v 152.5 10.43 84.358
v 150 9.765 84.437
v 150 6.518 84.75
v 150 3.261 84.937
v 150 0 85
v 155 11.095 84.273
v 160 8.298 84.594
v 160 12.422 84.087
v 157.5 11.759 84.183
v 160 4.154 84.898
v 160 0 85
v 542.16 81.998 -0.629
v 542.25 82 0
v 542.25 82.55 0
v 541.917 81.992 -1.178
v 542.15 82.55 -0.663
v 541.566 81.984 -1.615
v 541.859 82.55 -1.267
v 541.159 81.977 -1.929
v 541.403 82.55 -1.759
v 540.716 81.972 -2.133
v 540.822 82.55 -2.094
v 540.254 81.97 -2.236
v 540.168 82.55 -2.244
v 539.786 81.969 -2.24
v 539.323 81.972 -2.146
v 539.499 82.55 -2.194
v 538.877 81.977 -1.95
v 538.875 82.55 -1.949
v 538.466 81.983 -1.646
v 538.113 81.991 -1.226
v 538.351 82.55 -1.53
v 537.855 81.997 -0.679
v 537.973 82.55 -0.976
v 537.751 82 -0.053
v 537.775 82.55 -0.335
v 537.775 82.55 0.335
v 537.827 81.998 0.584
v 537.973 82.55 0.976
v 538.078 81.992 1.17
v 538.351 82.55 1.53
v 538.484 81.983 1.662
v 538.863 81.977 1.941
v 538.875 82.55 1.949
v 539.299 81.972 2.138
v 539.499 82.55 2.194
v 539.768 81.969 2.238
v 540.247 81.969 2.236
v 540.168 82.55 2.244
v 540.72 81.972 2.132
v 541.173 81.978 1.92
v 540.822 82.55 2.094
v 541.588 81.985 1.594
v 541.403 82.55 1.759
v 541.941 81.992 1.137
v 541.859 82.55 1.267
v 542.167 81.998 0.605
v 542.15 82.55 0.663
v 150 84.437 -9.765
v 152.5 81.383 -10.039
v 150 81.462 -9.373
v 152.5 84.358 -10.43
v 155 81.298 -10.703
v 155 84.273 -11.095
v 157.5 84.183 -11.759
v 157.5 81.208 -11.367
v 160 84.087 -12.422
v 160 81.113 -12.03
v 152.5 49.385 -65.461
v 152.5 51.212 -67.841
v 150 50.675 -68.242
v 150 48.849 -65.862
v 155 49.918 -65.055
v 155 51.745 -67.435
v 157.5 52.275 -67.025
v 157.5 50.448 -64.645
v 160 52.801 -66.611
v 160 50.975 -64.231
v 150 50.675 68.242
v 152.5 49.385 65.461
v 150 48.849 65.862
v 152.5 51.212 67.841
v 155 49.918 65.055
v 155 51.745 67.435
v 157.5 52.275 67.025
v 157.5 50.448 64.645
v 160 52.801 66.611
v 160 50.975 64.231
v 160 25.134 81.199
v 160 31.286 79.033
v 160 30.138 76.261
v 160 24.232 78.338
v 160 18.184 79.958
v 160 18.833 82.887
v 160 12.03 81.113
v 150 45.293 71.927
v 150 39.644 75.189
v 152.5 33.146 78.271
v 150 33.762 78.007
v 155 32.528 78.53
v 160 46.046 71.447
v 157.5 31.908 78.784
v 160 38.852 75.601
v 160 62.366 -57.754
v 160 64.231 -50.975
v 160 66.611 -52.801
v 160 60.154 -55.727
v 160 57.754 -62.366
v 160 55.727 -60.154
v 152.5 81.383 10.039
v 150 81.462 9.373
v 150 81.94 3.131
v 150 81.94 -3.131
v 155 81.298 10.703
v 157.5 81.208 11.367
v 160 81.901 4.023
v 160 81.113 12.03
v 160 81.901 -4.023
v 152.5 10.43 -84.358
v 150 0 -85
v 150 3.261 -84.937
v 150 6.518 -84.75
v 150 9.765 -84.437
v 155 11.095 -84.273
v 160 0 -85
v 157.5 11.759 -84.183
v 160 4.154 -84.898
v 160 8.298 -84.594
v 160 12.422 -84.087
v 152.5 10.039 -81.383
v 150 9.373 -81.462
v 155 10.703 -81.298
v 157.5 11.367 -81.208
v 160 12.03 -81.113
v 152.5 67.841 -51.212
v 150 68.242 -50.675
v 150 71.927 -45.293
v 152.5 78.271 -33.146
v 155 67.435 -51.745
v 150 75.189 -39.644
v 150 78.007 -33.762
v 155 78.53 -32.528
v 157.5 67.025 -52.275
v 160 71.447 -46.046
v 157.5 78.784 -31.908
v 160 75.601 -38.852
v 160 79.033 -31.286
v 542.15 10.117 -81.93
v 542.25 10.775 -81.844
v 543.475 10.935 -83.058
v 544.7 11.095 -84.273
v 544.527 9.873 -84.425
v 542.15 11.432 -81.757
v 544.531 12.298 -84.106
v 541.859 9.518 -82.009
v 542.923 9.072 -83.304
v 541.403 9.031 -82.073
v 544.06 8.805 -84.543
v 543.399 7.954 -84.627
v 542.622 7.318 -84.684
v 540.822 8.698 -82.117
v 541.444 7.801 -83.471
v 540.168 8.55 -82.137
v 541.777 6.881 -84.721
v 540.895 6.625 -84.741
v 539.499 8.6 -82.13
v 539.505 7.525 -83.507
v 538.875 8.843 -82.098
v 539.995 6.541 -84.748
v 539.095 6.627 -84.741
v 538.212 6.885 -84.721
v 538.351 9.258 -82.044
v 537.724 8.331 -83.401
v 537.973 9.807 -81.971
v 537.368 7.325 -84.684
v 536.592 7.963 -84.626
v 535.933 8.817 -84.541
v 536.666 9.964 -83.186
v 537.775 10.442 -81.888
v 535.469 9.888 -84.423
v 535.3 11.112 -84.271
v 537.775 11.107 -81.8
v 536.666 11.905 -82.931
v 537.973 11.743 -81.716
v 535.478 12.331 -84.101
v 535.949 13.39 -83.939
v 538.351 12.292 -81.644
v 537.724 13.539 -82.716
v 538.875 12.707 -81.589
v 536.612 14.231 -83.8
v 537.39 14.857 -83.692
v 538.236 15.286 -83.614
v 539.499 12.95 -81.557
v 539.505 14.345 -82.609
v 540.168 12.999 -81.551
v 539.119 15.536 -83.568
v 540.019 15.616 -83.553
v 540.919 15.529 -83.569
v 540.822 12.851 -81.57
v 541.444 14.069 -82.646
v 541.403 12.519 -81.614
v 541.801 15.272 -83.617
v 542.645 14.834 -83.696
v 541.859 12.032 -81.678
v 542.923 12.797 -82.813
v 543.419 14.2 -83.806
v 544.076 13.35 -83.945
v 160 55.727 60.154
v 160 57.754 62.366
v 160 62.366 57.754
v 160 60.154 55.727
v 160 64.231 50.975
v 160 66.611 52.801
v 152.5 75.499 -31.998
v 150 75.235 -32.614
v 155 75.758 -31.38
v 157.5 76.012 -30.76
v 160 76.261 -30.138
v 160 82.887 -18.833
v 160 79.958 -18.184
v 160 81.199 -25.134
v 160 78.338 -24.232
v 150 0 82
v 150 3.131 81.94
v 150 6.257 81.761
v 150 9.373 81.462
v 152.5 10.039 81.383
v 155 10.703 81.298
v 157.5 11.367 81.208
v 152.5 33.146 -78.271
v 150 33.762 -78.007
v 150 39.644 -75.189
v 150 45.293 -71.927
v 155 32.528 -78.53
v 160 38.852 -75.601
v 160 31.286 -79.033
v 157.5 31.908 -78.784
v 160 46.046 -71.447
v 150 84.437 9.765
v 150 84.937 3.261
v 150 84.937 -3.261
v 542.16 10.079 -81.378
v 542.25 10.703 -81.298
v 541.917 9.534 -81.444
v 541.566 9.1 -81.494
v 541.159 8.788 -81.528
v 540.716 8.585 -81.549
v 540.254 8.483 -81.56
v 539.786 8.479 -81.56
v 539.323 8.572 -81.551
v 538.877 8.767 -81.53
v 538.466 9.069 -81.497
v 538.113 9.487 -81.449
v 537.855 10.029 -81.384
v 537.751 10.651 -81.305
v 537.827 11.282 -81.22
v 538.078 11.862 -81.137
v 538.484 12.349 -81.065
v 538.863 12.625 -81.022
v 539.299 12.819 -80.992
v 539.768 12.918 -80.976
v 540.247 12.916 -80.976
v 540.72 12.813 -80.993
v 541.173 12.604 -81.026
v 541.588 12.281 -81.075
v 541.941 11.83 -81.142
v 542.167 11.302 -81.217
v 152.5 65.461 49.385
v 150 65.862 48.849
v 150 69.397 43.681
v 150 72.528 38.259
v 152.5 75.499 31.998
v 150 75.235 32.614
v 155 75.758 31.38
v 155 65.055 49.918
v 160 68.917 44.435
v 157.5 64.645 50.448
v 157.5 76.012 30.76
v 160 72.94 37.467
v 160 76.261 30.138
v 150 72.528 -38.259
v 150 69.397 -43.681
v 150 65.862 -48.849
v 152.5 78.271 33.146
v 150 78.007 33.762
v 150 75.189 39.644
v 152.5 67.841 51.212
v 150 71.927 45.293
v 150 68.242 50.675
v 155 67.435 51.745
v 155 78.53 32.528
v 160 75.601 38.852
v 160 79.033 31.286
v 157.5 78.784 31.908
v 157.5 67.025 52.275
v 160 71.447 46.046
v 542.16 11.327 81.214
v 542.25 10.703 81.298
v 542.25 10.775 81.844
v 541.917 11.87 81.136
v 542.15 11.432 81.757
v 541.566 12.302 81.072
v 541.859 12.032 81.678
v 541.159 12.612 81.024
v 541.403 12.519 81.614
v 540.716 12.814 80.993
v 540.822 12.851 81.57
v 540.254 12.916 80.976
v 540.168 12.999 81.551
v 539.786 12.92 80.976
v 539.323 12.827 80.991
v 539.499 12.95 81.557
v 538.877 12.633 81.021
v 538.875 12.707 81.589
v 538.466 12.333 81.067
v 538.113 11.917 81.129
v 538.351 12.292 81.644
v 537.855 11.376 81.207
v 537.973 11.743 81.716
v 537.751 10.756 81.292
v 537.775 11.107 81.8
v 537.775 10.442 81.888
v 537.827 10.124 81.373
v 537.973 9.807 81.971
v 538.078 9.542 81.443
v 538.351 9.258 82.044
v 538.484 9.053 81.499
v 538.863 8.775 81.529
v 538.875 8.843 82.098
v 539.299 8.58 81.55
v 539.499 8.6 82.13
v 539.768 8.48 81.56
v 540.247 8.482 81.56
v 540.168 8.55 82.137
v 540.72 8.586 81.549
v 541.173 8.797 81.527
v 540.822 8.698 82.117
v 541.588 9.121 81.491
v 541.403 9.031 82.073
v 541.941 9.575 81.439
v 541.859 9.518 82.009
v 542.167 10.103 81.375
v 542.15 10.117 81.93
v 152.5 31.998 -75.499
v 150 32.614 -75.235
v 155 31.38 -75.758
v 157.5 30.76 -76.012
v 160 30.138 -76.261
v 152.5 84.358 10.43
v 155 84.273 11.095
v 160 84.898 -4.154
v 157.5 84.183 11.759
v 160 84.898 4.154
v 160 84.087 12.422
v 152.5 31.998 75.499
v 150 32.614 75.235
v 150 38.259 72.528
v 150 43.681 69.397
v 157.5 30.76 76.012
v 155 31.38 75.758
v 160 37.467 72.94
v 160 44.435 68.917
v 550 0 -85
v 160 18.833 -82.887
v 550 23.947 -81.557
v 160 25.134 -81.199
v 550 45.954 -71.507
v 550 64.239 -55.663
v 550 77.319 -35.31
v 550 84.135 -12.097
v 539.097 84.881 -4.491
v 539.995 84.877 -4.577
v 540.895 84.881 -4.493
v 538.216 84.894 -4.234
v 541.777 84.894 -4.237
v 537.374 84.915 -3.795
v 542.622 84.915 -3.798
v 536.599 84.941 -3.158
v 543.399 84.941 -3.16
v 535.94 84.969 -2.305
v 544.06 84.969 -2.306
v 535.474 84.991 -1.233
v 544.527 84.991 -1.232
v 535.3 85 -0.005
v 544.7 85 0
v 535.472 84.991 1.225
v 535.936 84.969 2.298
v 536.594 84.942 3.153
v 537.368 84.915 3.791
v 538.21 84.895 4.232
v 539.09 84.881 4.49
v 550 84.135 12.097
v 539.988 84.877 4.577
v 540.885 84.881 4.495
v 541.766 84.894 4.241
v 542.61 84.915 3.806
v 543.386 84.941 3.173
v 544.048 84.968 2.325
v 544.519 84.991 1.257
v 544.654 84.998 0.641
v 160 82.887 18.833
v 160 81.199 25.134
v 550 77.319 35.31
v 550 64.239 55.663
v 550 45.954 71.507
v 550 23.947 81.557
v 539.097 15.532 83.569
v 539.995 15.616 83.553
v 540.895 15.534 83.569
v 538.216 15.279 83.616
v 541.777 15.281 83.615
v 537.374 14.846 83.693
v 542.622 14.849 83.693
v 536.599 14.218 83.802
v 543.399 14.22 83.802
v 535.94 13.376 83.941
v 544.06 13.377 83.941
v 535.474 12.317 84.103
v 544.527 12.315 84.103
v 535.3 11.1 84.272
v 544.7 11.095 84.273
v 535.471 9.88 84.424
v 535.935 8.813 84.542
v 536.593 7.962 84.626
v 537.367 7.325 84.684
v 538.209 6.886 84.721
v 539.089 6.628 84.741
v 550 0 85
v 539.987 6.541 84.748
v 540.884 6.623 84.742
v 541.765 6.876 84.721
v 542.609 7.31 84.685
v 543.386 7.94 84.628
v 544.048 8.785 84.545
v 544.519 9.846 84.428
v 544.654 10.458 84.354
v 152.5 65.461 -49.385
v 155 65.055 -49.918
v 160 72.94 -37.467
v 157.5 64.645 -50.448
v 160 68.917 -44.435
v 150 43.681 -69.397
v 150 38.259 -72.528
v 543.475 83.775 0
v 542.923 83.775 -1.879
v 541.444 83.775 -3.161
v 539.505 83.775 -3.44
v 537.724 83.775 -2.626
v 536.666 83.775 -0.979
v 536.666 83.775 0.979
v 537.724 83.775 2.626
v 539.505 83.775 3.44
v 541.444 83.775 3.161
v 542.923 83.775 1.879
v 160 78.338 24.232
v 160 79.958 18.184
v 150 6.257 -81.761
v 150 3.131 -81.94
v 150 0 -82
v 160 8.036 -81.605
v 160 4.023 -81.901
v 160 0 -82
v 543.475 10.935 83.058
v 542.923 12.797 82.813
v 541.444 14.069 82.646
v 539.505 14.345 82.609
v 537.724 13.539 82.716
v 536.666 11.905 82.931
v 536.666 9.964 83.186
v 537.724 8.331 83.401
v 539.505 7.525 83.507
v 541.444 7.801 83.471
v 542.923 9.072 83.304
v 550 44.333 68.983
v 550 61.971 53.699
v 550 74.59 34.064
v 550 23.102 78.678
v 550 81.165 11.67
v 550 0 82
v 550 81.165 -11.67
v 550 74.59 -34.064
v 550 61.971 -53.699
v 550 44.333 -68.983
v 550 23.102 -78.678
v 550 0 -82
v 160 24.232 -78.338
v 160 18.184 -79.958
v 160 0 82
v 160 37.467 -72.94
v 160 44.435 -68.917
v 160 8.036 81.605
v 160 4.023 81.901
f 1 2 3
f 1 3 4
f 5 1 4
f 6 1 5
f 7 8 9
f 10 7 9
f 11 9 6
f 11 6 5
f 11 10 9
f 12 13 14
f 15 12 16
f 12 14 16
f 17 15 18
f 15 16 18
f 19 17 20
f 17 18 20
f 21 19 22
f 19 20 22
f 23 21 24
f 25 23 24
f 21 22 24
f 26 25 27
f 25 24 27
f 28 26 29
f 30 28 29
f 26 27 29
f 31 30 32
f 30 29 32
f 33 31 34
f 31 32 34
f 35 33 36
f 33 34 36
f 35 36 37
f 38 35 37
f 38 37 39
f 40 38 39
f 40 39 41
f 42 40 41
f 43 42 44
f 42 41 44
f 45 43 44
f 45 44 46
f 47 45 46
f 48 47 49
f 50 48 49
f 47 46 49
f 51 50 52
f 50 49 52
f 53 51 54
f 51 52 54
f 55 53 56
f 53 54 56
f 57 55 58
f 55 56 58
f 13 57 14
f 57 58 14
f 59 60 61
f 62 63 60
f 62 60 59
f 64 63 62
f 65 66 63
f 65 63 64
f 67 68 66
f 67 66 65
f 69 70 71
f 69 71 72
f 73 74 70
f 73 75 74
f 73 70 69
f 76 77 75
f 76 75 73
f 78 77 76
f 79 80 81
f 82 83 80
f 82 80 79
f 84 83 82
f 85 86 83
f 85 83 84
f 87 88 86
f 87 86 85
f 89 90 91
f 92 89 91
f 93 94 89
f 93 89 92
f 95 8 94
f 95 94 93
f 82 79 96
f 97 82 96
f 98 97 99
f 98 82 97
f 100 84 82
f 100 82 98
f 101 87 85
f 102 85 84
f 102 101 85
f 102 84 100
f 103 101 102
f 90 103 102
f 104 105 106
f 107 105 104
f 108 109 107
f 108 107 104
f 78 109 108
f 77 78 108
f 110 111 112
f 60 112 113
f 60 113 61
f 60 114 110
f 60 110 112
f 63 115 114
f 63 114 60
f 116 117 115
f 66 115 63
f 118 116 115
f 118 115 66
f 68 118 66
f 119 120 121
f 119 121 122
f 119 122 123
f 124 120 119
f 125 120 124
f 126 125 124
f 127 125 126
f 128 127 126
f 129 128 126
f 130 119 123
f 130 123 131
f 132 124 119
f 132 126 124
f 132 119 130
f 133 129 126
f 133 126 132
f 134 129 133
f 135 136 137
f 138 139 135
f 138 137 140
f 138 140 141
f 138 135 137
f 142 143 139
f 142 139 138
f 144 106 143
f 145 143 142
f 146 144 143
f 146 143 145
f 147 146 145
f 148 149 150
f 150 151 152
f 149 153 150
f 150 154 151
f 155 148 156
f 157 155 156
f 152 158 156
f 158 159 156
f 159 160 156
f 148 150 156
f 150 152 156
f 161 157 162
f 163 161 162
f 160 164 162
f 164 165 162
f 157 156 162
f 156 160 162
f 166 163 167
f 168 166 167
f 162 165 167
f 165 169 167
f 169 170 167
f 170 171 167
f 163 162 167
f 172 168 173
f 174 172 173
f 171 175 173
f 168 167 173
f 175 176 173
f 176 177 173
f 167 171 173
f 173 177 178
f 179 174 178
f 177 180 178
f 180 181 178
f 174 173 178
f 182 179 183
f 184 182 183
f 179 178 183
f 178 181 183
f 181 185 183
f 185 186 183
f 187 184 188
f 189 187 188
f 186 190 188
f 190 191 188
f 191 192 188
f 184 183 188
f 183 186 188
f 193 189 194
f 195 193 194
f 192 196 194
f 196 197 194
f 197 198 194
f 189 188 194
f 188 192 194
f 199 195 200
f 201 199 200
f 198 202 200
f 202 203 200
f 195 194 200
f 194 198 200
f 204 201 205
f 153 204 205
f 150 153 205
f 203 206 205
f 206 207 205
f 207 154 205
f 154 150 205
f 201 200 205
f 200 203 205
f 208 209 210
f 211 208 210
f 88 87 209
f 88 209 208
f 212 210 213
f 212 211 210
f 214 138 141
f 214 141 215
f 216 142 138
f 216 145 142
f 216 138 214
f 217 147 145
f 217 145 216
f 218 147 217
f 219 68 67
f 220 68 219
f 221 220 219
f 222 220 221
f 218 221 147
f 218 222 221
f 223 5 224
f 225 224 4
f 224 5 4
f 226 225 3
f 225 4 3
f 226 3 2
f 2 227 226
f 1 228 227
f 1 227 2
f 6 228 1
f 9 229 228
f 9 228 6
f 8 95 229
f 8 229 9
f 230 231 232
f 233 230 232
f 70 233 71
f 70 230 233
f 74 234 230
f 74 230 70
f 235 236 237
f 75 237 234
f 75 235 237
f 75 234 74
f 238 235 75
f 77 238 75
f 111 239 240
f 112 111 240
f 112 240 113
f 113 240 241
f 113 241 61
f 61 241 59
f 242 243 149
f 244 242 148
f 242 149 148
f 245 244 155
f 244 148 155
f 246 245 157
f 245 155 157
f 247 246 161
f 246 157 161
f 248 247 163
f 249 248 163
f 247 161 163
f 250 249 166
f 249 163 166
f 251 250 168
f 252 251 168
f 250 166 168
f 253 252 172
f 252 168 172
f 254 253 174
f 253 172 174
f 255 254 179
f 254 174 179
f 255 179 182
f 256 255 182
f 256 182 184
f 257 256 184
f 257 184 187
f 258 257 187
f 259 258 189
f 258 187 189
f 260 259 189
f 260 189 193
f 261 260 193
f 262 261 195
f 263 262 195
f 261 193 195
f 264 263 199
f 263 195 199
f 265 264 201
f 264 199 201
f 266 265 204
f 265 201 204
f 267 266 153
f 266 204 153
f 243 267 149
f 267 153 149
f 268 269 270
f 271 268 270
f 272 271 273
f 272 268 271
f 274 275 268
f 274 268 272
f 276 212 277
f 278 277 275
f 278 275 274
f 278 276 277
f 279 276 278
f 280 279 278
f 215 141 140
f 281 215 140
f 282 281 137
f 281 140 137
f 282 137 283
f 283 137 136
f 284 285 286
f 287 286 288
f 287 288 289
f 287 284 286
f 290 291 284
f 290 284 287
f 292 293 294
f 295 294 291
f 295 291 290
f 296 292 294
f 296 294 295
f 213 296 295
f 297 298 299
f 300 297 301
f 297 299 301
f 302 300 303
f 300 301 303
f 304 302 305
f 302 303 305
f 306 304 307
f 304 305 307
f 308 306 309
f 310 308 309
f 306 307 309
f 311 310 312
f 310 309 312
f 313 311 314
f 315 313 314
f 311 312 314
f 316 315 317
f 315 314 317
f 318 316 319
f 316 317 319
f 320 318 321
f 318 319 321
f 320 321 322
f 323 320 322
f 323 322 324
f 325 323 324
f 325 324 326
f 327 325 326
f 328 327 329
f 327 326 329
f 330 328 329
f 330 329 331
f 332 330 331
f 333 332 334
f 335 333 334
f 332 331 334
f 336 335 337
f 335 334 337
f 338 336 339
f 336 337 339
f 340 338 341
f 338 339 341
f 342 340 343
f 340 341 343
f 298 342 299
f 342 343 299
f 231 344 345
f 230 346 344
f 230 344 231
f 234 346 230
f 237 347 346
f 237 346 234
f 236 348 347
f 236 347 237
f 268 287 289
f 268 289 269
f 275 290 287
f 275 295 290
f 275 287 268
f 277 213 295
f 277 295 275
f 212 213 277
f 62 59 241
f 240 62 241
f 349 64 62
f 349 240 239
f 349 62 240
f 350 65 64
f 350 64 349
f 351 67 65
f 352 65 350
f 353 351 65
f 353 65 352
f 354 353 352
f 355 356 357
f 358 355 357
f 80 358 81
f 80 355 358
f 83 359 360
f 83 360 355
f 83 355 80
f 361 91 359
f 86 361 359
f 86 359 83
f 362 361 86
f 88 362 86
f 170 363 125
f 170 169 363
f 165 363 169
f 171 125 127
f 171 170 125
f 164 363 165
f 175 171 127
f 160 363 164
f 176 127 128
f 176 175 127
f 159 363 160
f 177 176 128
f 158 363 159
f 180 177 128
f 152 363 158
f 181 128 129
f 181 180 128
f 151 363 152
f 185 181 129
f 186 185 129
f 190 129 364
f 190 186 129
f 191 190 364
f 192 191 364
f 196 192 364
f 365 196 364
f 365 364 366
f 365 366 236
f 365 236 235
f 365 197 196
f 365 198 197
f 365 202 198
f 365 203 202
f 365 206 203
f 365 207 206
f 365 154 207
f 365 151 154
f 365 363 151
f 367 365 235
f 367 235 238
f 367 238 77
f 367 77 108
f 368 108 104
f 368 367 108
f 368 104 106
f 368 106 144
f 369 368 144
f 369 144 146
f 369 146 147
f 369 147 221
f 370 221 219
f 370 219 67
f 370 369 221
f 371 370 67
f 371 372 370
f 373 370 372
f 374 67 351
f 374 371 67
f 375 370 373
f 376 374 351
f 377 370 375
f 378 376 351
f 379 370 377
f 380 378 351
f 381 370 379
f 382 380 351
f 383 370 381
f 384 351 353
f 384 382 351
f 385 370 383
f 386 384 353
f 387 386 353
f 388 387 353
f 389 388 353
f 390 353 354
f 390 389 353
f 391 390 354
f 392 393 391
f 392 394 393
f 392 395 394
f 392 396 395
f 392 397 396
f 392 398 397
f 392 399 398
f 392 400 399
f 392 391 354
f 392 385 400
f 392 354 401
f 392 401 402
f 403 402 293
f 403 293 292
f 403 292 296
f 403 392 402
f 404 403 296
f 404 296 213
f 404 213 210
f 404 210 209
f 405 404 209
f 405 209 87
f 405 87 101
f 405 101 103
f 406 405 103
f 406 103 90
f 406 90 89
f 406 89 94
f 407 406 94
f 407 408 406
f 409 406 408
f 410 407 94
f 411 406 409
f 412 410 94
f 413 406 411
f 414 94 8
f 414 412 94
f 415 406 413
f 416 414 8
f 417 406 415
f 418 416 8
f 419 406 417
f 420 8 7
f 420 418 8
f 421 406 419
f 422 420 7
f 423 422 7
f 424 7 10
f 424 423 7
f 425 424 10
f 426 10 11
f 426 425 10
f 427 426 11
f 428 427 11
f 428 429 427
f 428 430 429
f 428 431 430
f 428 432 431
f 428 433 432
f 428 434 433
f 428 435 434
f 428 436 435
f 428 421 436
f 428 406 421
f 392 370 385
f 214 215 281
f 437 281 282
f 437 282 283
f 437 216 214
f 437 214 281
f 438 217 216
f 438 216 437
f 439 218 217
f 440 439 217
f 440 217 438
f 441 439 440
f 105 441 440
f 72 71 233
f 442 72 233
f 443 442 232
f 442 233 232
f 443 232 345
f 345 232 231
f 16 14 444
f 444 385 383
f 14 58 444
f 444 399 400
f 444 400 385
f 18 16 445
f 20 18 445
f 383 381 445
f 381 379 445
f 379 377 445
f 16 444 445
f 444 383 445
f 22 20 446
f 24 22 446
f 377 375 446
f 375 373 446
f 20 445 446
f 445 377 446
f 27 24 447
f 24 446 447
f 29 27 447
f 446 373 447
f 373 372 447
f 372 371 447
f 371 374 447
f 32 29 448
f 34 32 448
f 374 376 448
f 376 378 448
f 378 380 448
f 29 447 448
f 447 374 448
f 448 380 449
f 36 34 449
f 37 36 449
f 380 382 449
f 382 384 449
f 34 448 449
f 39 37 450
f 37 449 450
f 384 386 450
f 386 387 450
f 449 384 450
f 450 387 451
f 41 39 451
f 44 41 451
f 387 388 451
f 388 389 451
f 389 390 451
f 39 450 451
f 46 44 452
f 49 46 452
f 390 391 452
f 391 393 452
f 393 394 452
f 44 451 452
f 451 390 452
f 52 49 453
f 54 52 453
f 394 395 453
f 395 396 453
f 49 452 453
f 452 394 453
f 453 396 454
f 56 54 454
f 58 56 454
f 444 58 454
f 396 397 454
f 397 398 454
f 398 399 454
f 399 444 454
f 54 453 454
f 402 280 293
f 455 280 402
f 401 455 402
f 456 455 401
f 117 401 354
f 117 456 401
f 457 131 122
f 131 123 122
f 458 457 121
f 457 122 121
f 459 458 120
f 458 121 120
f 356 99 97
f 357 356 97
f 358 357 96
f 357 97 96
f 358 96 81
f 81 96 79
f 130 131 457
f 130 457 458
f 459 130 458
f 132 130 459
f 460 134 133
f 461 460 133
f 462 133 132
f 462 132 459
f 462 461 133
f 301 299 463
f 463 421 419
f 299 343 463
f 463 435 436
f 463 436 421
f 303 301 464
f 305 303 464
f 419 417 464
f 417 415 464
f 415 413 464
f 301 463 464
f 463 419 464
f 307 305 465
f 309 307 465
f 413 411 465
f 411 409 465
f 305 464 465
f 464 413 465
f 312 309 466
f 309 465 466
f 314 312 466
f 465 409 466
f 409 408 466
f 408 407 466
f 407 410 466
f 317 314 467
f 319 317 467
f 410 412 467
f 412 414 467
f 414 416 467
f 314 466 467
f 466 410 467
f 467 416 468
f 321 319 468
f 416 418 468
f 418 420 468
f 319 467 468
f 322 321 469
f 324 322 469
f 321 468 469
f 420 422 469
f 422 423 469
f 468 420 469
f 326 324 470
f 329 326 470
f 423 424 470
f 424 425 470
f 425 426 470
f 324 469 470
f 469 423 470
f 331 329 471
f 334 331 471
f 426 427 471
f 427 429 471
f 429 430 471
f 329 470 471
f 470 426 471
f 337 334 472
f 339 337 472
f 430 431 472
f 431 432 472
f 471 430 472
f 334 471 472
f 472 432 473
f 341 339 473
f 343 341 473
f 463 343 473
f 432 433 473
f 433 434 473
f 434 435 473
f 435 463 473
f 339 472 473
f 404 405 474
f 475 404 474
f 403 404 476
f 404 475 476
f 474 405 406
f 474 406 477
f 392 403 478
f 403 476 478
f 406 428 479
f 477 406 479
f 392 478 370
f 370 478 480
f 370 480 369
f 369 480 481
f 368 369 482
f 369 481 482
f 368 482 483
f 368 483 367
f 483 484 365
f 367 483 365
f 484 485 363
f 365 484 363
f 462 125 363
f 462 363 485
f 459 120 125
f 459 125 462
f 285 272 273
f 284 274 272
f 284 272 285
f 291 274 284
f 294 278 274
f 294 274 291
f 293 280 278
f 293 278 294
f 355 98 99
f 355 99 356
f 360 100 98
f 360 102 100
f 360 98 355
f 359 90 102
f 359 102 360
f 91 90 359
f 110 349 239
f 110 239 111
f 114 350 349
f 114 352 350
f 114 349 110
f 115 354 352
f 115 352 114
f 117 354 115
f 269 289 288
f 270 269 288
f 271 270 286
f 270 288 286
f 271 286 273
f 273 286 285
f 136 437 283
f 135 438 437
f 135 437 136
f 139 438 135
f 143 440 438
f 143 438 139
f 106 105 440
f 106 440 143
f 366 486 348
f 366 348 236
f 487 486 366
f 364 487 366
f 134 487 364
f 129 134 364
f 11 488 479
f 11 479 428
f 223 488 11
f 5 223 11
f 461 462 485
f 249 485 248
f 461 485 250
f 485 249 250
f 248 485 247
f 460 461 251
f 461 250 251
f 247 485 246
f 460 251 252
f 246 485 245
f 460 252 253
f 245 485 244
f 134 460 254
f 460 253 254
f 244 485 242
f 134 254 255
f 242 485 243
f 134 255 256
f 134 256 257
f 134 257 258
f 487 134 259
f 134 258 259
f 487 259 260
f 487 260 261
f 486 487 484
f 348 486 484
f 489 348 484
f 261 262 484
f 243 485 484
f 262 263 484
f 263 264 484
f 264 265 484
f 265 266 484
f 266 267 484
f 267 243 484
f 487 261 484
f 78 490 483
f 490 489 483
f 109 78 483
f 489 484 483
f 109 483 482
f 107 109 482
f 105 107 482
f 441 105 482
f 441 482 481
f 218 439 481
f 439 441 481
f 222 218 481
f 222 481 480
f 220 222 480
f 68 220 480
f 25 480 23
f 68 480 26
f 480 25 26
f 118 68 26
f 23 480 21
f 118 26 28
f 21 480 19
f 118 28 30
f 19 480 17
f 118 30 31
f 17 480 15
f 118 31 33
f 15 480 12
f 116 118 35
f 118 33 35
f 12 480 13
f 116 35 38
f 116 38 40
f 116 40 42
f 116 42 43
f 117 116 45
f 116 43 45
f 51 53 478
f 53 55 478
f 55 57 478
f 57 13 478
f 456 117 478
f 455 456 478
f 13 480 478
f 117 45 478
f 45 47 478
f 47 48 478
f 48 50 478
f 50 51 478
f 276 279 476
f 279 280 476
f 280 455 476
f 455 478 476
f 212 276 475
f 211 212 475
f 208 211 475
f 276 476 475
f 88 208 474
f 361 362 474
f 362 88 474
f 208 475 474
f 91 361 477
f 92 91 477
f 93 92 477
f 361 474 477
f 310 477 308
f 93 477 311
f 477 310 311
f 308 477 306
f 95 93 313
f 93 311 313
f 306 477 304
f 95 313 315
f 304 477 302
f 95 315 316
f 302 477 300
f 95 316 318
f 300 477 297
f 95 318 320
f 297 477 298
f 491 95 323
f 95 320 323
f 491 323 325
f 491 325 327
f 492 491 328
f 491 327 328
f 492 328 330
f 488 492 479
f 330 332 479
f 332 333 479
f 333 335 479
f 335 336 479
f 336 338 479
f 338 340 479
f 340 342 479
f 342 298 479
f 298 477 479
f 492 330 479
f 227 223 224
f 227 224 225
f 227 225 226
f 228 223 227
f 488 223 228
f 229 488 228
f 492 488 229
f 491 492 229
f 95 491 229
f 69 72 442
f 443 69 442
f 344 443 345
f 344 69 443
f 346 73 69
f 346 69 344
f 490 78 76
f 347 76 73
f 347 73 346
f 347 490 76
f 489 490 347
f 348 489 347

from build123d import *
from build123d.topology import SkipClean

# Parameters (mm, degrees)
SKETCH1_W                      = 390
SKETCH1_H                      = 3
BOSS_EXTRUDE1_DEPTH            = 5
DRAFT1_ANGLE                   = -15
CIRPATTERN1_COUNT              = 12
DRAFT1_OF_CIRPATTERN1_2_ANGLE  = -15
DRAFT1_OF_CIRPATTERN1_3_ANGLE  = -15
DRAFT1_OF_CIRPATTERN1_4_ANGLE  = -15
DRAFT1_OF_CIRPATTERN1_5_ANGLE  = -15
DRAFT1_OF_CIRPATTERN1_6_ANGLE  = -15
DRAFT1_OF_CIRPATTERN1_7_ANGLE  = -15
DRAFT1_OF_CIRPATTERN1_8_ANGLE  = -15
DRAFT1_OF_CIRPATTERN1_9_ANGLE  = -15
DRAFT1_OF_CIRPATTERN1_10_ANGLE = -15
DRAFT1_OF_CIRPATTERN1_11_ANGLE = -15
DRAFT1_OF_CIRPATTERN1_12_ANGLE = -15
SKETCH3_OUTSIDE_W              = 265.338
SKETCH3_OUTSIDE_H              = 265.338
CUT_EXTRUDE1_DEPTH             = 563.983125857


# Read off the part's stored shape, not the designer's step: CSK for M4 Countersunk Flat Head Screw1
with BuildPart() as part:
    # Sketch1 → Revolve1 (revolve)
    with BuildSketch(Plane.XY, mode=Mode.PRIVATE) as revolve1_sk:
        with Locations((355, 83.5)):
            Rectangle(SKETCH1_W, SKETCH1_H)
    revolve(revolve1_sk.sketch.rotate(Axis((0, 0, 0), (1, 0, 0)), 90), axis=Axis((0, 0, 0), (1, 0, 0)))

    # Sketch2 → Boss-Extrude1 (add, symmetric)
    with BuildSketch(Plane(origin=(155, 0, 0), x_dir=(0, 0, -1), z_dir=(1, 0, 0))):
        with BuildLine():
            Line((10.703147762, 81.298478633), (11.094726339, 84.272813217))
            ThreePointArc((11.094726339, 84.272813217), (0, 85), (-11.094726339, 84.272813217))
            Line((-11.094726339, 84.272813217), (-10.703147762, 81.298478633))
            ThreePointArc((-10.703147762, 81.298478633), (0, 82), (10.703147762, 81.298478633))
        make_face()
    boss_extrude1 = extrude(amount=BOSS_EXTRUDE1_DEPTH, both=True)

    # Draft1
    draft1_faces = [part.faces().sort_by_distance(p)[0] for p in [
        (155, 82.785645925, 10.89893705),
        (155, 82.785645925, -10.89893705),
    ]]
    draft(draft1_faces, Plane(origin=(155, 0, 0), x_dir=(0, 0, 1), z_dir=(1, 0, 0)), DRAFT1_ANGLE)

    # CirPattern1: Boss-Extrude1 ×12 about axis
    with SkipClean():  # the faces are left unmerged after this step: merging them gives an invalid solid
        cirpattern1_axis = Axis((0, 0, 0), (1, 0, 0))
        for i in range(1, CIRPATTERN1_COUNT):
            add(boss_extrude1.rotate(cirpattern1_axis, i * 360 / CIRPATTERN1_COUNT))

    # Draft1 of CirPattern1 2
    draft1_of_cirpattern1_2_faces = [part.faces().sort_by_distance(p)[0] for p in [
        (155, 66.245003914, 50.831579322),
        (155, 77.143940965, 31.954066602),
    ]]
    draft(draft1_of_cirpattern1_2_faces, Plane(origin=(155, 0, 0), x_dir=(0, -0.49999999999999994, 0.8660254037844387), z_dir=(1, 0, 0)), DRAFT1_OF_CIRPATTERN1_2_ANGLE)

    # Draft1 of CirPattern1 3
    draft1_of_cirpattern1_3_faces = [part.faces().sort_by_distance(p)[0] for p in [
        (155, 31.954066602, 77.143940965),
        (155, 50.831579322, 66.245003914),
    ]]
    draft(draft1_of_cirpattern1_3_faces, Plane(origin=(155, 0, 0), x_dir=(0, -0.8660254037844386, 0.5000000000000001), z_dir=(1, 0, 0)), DRAFT1_OF_CIRPATTERN1_3_ANGLE)

    # Draft1 of CirPattern1 4
    draft1_of_cirpattern1_4_faces = [part.faces().sort_by_distance(p)[0] for p in [
        (155, -10.89893705, 82.785645925),
        (155, 10.89893705, 82.785645925),
    ]]
    draft(draft1_of_cirpattern1_4_faces, Plane(origin=(155, 0, 0), x_dir=(0, -1, 0), z_dir=(1, 0, 0)), DRAFT1_OF_CIRPATTERN1_4_ANGLE)

    # Draft1 of CirPattern1 5
    draft1_of_cirpattern1_5_faces = [part.faces().sort_by_distance(p)[0] for p in [
        (155, -50.831579322, 66.245003914),
        (155, -31.954066602, 77.143940965),
    ]]
    draft(draft1_of_cirpattern1_5_faces, Plane(origin=(155, 0, 0), x_dir=(0, -0.8660254037844387, -0.4999999999999998), z_dir=(1, 0, 0)), DRAFT1_OF_CIRPATTERN1_5_ANGLE)

    # Draft1 of CirPattern1 6
    draft1_of_cirpattern1_6_faces = [part.faces().sort_by_distance(p)[0] for p in [
        (155, -77.143940965, 31.954066602),
        (155, -66.245003914, 50.831579322),
    ]]
    draft(draft1_of_cirpattern1_6_faces, Plane(origin=(155, 0, 0), x_dir=(0, -0.49999999999999994, -0.8660254037844387), z_dir=(1, 0, 0)), DRAFT1_OF_CIRPATTERN1_6_ANGLE)

    # Draft1 of CirPattern1 7
    draft1_of_cirpattern1_7_faces = [part.faces().sort_by_distance(p)[0] for p in [
        (155, -82.785645925, -10.89893705),
        (155, -82.785645925, 10.89893705),
    ]]
    draft(draft1_of_cirpattern1_7_faces, Plane(origin=(155, 0, 0), x_dir=(0, 0, -1), z_dir=(1, 0, 0)), DRAFT1_OF_CIRPATTERN1_7_ANGLE)

    # Draft1 of CirPattern1 8
    draft1_of_cirpattern1_8_faces = [part.faces().sort_by_distance(p)[0] for p in [
        (155, -66.245003914, -50.831579322),
        (155, -77.143940965, -31.954066602),
    ]]
    draft(draft1_of_cirpattern1_8_faces, Plane(origin=(155, 0, 0), x_dir=(0, 0.5000000000000001, -0.8660254037844386), z_dir=(1, 0, 0)), DRAFT1_OF_CIRPATTERN1_8_ANGLE)

    # Draft1 of CirPattern1 9
    draft1_of_cirpattern1_9_faces = [part.faces().sort_by_distance(p)[0] for p in [
        (155, -31.954066602, -77.143940965),
        (155, -50.831579322, -66.245003914),
    ]]
    draft(draft1_of_cirpattern1_9_faces, Plane(origin=(155, 0, 0), x_dir=(0, 0.8660254037844384, -0.5000000000000004), z_dir=(1, 0, 0)), DRAFT1_OF_CIRPATTERN1_9_ANGLE)

    # Draft1 of CirPattern1 10
    draft1_of_cirpattern1_10_faces = [part.faces().sort_by_distance(p)[0] for p in [
        (155, 10.89893705, -82.785645925),
        (155, -10.89893705, -82.785645925),
    ]]
    draft(draft1_of_cirpattern1_10_faces, Plane.YZ.offset(155), DRAFT1_OF_CIRPATTERN1_10_ANGLE)

    # Draft1 of CirPattern1 11
    draft1_of_cirpattern1_11_faces = [part.faces().sort_by_distance(p)[0] for p in [
        (155, 50.831579322, -66.245003914),
        (155, 31.954066602, -77.143940965),
    ]]
    draft(draft1_of_cirpattern1_11_faces, Plane(origin=(155, 0, 0), x_dir=(0, 0.8660254037844386, 0.5000000000000001), z_dir=(1, 0, 0)), DRAFT1_OF_CIRPATTERN1_11_ANGLE)

    # Draft1 of CirPattern1 12
    draft1_of_cirpattern1_12_faces = [part.faces().sort_by_distance(p)[0] for p in [
        (155, 77.143940965, -31.954066602),
        (155, 66.245003914, -50.831579322),
    ]]
    draft(draft1_of_cirpattern1_12_faces, Plane(origin=(155, 0, 0), x_dir=(0, 0.5000000000000004, 0.8660254037844384), z_dir=(1, 0, 0)), DRAFT1_OF_CIRPATTERN1_12_ANGLE)

    # Sketch3 outside → Cut-Extrude1 (cut, through all)
    with SkipClean():  # the faces are left unmerged after this step: merging them gives an invalid solid
        with BuildSketch(Plane(origin=(0, 0, 0), x_dir=(0, 0, -1), z_dir=(1, 0, 0))):
            Rectangle(SKETCH3_OUTSIDE_W, SKETCH3_OUTSIDE_H)
            with BuildLine():
                Line((0, 0), (-85, 0))
                ThreePointArc((-85, 0), (0, 85), (85, 0))
                Line((85, 0), (0, 0))
            make_face(mode=Mode.SUBTRACT)
        extrude(amount=CUT_EXTRUDE1_DEPTH, mode=Mode.SUBTRACT)

    # CSK for M4 Countersunk Flat Head Scr 2 → CSK for M4 Countersunk Flat Head Screw1 (revolve, cut)
    with SkipClean():  # the faces are left unmerged after this step: merging them gives an invalid solid
        with BuildSketch(Plane(origin=(540, 0, 0), x_dir=(1, 0, 0), z_dir=(0, 0, 1))):
            Polygon((4.700033545, 85.000033545), (0, 85.000033545), (0, 81.96910869), (2.25, 81.96910869), (2.25, 82.55), align=None)
        revolve(axis=Axis((540, 0, 0), (0, 1, 0)), mode=Mode.SUBTRACT)

    # CSK for M4 Countersunk Flat Head Scr 3 o → CSK for M4 Countersunk Flat Head Scr 3 (revolve, cut)
    with SkipClean():  # the faces are left unmerged after this step: merging them gives an invalid solid
        with BuildSketch(Plane(origin=(540, 0, 0), x_dir=(1, 0, 0), z_dir=(0, 0.9914448613738104, 0.13052619222005205))):
            Polygon((4.700071897, 85.000071897), (0, 85.000071897), (0, 81.96910869), (2.25, 81.96910869), (2.25, 82.55), align=None)
        revolve(axis=Axis((540, 0, 0), (0, 0.13052619222005205, -0.9914448613738104)), mode=Mode.SUBTRACT)

    # CSK for M4 Countersunk Flat Head Scr 4 o → CSK for M4 Countersunk Flat Head Scr 4 (revolve, cut)
    with SkipClean():  # the faces are left unmerged after this step: merging them gives an invalid solid
        with BuildSketch(Plane(origin=(540, 0, 0), x_dir=(1, 0, 0), z_dir=(0, -0.9914448613738104, 0.13052619222005205))):
            Polygon((4.700070707, 85.000070707), (0, 85.000070707), (0, 81.96910869), (2.25, 81.96910869), (2.25, 82.55), align=None)
        revolve(axis=Axis((540, 0, 0), (0, 0.13052619222005205, 0.9914448613738104)), mode=Mode.SUBTRACT)


solid = part.part
